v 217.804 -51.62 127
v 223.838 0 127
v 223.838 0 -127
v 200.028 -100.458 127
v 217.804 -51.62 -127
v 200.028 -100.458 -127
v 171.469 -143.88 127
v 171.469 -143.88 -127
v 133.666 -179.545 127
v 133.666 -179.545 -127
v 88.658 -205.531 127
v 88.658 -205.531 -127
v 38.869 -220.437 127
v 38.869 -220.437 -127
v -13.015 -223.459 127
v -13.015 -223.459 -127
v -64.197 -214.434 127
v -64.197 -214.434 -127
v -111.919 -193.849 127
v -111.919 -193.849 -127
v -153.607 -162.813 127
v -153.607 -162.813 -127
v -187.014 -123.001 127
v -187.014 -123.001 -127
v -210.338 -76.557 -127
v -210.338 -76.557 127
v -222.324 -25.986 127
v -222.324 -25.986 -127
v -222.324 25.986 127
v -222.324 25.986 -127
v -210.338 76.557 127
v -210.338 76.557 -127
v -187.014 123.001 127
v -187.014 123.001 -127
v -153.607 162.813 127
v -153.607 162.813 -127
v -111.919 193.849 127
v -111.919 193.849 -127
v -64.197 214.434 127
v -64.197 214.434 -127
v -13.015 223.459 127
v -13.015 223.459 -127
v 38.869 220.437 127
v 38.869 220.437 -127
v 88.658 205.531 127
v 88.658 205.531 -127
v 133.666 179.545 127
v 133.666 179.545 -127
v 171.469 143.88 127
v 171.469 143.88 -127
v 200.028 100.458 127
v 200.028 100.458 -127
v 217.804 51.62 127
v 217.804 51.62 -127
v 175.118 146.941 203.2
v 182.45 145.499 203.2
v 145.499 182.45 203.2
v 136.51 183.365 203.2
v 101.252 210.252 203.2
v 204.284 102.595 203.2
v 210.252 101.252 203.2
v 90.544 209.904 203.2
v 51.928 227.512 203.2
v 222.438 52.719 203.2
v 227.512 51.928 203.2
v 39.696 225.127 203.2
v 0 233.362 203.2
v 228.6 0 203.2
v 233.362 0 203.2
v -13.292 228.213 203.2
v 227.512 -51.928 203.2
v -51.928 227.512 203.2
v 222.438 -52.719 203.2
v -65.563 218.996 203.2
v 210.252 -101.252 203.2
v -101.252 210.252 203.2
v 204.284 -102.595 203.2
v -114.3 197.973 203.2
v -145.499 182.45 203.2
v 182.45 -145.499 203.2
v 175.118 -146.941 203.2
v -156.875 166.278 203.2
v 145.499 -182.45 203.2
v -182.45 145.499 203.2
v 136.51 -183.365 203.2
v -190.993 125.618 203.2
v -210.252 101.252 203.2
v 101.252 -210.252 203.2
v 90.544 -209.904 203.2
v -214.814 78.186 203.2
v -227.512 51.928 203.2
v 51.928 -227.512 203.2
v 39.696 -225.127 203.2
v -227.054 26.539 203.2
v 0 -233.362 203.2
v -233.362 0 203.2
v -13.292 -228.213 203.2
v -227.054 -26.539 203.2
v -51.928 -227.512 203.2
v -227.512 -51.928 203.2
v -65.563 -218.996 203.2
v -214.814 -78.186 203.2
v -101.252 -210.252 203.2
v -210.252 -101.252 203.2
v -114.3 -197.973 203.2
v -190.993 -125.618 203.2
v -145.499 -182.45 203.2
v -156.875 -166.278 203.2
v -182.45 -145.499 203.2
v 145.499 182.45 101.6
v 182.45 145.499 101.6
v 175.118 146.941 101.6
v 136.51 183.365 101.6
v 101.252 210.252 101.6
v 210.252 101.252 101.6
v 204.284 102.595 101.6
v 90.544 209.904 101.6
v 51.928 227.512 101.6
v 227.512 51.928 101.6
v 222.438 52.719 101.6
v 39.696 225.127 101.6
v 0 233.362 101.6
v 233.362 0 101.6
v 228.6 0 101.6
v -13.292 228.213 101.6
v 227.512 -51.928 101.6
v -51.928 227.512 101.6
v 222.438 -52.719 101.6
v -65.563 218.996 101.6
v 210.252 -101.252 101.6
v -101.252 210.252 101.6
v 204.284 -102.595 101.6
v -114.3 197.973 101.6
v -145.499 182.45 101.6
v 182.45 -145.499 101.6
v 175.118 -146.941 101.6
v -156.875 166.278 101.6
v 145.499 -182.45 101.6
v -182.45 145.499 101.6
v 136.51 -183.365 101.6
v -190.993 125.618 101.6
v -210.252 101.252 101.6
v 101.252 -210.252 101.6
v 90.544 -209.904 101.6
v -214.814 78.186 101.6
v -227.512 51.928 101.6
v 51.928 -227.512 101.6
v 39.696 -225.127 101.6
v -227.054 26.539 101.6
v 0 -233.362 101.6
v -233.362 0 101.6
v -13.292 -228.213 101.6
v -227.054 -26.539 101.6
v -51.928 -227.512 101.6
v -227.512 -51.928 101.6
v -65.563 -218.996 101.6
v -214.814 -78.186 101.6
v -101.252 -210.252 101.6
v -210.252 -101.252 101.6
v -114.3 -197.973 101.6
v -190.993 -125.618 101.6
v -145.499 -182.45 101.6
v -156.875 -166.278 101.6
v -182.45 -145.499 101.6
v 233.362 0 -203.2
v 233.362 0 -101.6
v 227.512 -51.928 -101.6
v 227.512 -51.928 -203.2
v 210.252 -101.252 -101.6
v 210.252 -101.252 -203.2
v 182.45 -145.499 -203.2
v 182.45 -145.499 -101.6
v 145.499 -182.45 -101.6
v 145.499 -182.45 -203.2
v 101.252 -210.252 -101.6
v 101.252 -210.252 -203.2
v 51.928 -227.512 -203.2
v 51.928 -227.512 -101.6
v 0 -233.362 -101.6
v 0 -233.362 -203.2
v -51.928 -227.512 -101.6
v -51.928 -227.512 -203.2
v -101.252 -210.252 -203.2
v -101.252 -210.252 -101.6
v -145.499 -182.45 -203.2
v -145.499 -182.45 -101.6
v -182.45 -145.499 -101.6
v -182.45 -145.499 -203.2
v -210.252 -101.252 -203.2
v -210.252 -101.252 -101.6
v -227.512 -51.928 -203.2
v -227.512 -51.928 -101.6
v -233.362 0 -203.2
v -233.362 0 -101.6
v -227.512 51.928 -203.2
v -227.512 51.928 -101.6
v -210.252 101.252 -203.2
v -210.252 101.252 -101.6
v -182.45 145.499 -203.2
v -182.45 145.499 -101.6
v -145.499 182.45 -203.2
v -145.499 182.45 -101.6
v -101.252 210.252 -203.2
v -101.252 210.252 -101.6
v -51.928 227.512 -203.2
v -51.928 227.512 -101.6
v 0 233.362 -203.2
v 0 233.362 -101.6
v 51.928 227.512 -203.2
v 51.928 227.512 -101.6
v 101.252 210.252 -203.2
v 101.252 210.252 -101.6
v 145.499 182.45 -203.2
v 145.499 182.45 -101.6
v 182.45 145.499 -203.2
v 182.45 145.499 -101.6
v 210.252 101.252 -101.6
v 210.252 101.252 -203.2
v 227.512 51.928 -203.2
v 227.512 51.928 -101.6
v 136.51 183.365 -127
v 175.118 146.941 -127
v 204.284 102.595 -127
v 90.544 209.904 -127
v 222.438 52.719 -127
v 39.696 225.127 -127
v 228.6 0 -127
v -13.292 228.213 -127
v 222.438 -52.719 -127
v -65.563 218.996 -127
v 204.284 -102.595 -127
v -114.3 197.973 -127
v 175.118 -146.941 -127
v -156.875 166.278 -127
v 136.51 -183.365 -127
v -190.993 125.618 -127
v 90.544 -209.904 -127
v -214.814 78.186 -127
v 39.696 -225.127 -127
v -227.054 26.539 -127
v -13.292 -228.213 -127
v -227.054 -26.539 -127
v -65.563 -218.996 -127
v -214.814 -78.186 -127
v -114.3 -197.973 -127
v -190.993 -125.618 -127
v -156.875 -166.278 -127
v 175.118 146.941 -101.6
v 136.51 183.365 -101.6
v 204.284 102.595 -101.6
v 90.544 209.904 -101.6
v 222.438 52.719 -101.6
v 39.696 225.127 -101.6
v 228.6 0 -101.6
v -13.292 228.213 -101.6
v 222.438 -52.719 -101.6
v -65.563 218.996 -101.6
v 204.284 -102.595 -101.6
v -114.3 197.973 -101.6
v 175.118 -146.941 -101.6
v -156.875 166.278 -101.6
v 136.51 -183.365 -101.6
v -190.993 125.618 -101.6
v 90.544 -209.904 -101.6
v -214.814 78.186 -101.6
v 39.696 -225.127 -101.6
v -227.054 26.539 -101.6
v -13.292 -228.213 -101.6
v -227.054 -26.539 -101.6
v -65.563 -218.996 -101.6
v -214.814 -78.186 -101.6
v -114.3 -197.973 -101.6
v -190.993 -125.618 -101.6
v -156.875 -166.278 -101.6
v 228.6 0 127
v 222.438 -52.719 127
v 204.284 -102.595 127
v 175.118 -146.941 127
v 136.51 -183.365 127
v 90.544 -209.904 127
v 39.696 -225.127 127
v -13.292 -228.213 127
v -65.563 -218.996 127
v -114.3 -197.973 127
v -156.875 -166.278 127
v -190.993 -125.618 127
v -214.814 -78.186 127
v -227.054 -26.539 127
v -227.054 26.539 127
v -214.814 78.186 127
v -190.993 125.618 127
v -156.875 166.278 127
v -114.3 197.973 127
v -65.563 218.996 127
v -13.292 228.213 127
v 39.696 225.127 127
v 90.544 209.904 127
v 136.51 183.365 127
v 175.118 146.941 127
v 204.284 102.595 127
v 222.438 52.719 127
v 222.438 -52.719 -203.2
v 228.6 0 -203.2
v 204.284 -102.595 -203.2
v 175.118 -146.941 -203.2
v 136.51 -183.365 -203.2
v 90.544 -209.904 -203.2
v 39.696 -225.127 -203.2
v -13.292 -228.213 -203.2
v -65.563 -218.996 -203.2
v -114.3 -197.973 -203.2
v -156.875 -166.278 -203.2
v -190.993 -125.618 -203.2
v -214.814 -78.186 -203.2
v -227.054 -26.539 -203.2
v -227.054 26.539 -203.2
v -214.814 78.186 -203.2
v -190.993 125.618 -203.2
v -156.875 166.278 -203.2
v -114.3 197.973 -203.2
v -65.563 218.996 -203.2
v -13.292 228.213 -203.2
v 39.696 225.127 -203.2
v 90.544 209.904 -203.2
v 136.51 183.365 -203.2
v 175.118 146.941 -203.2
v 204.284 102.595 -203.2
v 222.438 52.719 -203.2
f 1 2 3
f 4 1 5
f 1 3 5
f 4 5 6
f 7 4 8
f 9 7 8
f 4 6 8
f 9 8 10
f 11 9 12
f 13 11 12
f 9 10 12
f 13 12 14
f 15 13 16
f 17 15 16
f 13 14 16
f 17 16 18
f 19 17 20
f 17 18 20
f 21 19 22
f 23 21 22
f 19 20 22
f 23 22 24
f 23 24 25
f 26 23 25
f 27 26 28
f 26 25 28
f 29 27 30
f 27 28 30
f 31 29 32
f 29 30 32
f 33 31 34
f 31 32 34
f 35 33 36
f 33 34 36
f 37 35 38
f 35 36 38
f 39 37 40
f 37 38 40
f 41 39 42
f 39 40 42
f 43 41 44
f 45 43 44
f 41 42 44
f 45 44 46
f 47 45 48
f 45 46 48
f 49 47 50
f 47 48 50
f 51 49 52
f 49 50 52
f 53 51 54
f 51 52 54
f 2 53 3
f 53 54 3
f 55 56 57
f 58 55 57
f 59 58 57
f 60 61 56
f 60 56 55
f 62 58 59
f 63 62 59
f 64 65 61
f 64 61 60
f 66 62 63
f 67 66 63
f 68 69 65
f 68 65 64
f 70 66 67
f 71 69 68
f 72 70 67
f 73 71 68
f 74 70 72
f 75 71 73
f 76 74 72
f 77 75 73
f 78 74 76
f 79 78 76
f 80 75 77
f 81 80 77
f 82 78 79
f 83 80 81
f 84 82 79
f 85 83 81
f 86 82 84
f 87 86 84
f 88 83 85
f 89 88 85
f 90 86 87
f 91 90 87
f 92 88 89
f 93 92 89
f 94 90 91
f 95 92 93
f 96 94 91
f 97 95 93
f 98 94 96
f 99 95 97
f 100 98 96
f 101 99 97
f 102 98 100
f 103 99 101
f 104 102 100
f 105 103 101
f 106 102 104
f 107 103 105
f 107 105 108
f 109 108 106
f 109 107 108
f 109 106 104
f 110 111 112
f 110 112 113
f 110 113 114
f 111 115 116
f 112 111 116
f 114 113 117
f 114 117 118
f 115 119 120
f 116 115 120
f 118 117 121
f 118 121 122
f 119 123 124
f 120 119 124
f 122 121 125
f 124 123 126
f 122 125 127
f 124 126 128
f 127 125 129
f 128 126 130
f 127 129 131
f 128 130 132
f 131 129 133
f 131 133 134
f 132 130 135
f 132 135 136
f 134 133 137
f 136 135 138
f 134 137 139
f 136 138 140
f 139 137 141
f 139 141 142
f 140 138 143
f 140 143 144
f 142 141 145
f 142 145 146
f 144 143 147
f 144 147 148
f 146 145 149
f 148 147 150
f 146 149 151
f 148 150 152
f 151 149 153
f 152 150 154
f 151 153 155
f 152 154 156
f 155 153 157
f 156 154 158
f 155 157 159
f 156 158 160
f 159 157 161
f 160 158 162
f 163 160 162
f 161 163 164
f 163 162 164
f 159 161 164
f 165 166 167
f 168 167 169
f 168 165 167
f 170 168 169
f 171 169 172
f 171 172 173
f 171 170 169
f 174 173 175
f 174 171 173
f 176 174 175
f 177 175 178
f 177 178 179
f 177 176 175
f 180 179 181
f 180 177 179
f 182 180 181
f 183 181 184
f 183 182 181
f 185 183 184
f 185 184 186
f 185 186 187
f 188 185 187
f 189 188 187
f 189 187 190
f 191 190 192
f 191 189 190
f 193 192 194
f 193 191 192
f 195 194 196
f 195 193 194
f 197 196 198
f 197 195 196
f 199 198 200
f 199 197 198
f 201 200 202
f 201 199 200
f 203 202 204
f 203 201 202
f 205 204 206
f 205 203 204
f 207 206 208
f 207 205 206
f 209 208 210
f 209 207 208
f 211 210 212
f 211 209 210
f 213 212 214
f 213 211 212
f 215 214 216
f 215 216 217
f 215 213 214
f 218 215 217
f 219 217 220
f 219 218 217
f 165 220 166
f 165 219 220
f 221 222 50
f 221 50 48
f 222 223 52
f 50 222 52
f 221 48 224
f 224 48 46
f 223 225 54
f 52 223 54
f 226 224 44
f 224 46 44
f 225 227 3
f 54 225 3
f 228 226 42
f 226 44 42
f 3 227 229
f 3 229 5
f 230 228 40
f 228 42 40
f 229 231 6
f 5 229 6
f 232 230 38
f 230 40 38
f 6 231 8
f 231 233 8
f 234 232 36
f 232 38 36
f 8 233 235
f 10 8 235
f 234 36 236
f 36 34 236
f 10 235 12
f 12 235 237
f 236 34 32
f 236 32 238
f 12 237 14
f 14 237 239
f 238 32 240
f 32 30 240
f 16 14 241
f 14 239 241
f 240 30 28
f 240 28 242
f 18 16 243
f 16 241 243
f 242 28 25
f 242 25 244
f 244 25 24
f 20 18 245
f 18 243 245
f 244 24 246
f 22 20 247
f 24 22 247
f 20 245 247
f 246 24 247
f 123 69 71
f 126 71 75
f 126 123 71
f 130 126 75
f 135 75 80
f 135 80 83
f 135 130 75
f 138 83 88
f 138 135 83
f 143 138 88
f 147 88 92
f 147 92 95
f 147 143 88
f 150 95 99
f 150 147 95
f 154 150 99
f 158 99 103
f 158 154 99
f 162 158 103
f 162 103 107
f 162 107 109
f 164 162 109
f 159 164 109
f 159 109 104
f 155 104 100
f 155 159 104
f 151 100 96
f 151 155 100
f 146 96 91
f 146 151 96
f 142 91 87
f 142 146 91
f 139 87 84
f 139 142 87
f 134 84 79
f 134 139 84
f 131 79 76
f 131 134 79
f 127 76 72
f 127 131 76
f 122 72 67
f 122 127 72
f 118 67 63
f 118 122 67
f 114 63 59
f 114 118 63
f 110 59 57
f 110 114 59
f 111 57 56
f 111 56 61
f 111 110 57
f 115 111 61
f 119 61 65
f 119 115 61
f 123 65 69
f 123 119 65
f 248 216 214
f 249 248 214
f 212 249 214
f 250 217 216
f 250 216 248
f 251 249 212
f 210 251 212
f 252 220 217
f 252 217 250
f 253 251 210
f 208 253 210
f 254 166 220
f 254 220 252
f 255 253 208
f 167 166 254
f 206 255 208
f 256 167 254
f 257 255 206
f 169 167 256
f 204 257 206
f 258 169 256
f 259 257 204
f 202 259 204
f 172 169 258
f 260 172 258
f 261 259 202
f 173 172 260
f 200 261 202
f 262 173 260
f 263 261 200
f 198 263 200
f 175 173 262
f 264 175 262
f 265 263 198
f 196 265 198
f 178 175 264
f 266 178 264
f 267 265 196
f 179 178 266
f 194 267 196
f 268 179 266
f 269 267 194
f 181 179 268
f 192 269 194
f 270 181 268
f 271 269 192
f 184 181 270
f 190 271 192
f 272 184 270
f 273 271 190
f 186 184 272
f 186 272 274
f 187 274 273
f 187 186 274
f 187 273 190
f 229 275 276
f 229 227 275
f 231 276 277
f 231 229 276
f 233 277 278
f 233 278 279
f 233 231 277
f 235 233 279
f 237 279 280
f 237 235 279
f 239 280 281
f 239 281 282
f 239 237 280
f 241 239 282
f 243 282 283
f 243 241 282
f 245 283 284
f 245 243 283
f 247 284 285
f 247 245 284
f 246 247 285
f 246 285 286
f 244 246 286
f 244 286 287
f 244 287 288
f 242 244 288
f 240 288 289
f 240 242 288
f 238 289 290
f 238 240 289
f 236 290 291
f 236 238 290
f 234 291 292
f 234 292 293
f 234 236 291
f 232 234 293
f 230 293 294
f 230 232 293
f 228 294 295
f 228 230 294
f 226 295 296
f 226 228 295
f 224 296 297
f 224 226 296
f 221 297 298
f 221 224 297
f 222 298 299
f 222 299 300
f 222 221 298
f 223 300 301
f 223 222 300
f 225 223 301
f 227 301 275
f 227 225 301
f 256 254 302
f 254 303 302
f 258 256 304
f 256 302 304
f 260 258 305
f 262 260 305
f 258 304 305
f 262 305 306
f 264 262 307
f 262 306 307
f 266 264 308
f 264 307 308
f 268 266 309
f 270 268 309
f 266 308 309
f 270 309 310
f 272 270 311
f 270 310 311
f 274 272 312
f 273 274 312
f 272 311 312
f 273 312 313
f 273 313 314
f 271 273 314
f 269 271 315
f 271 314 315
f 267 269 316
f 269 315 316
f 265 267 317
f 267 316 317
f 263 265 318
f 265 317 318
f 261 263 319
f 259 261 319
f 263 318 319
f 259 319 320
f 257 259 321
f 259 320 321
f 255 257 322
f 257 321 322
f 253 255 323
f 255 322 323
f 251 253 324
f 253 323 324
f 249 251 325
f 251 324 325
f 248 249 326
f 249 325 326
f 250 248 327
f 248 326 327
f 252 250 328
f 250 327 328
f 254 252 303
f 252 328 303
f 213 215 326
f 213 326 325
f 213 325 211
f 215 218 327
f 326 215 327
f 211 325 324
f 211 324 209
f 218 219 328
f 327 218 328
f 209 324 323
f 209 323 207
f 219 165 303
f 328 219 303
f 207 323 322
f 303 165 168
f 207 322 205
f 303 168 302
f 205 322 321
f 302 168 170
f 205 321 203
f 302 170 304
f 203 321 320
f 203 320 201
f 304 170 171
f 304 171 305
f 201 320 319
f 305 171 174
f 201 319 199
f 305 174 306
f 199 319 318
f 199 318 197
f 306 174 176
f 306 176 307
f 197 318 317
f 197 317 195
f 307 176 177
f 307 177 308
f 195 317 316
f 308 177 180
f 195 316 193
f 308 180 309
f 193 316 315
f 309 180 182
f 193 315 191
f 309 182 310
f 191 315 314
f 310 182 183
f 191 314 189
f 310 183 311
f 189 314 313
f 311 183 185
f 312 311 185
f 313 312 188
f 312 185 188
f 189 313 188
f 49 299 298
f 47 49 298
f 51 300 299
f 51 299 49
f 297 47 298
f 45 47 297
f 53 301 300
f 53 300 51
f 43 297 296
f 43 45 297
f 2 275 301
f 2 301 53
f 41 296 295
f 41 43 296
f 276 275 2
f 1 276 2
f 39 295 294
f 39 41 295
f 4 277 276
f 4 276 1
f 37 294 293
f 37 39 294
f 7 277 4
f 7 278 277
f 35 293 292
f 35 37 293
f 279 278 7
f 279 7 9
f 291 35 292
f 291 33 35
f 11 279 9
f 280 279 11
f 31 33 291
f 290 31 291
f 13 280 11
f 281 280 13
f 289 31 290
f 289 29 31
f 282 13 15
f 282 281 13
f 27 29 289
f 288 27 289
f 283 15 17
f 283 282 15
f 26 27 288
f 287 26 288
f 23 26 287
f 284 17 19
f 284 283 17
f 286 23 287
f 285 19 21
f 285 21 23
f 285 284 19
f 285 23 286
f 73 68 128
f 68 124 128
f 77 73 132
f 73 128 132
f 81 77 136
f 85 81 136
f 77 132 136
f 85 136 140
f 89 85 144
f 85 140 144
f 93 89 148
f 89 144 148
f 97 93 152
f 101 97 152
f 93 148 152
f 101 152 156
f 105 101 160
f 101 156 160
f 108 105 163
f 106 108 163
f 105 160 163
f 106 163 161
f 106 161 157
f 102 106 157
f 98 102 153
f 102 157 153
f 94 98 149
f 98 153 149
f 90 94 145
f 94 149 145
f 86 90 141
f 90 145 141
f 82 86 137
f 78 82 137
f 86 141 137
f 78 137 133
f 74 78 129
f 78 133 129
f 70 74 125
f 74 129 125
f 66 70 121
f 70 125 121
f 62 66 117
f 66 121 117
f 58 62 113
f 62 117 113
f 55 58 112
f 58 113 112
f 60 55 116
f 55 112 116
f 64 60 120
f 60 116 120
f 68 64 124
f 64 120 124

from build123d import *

# Parameters (mm, degrees)
SKETCH2_W = 101.6
SKETCH2_H = 4.7625
SKETCH3_W = 254
SKETCH3_H = 4.7625


with BuildPart() as part:
    # Sketch2 → Revolve1 (revolve)
    with BuildSketch(Plane(origin=(0, 0, 0), x_dir=(0, 0, -1), z_dir=(1, 0, 0)), mode=Mode.PRIVATE) as revolve1_sk:
        with Locations((-152.4, 230.98125)):
            Rectangle(SKETCH2_W, SKETCH2_H)
        with Locations((152.4, 230.98125)):
            Rectangle(SKETCH2_W, SKETCH2_H)
    revolve(revolve1_sk.sketch.rotate(Axis((0, 0, 62.594581749), (0, 0, -1)), 90), axis=Axis((0, 0, 62.594581749), (0, 0, -1)))  # turned: the seam where the file's is


with BuildPart() as body_2:
    # Sketch3 → Revolve2 (revolve)
    with BuildSketch(Plane(origin=(0, 0, 0), x_dir=(0, 0, -1), z_dir=(1, 0, 0)), mode=Mode.PRIVATE) as revolve2_sk:
        with Locations((0, 226.21875)):
            Rectangle(SKETCH3_W, SKETCH3_H)
    revolve(revolve2_sk.sketch.rotate(Axis((0, 0, 0), (0, 0, -1)), 90), axis=Axis((0, 0, 0), (0, 0, -1)))  # turned: the seam where the file's is


solid = Compound([part.part, body_2.part])
